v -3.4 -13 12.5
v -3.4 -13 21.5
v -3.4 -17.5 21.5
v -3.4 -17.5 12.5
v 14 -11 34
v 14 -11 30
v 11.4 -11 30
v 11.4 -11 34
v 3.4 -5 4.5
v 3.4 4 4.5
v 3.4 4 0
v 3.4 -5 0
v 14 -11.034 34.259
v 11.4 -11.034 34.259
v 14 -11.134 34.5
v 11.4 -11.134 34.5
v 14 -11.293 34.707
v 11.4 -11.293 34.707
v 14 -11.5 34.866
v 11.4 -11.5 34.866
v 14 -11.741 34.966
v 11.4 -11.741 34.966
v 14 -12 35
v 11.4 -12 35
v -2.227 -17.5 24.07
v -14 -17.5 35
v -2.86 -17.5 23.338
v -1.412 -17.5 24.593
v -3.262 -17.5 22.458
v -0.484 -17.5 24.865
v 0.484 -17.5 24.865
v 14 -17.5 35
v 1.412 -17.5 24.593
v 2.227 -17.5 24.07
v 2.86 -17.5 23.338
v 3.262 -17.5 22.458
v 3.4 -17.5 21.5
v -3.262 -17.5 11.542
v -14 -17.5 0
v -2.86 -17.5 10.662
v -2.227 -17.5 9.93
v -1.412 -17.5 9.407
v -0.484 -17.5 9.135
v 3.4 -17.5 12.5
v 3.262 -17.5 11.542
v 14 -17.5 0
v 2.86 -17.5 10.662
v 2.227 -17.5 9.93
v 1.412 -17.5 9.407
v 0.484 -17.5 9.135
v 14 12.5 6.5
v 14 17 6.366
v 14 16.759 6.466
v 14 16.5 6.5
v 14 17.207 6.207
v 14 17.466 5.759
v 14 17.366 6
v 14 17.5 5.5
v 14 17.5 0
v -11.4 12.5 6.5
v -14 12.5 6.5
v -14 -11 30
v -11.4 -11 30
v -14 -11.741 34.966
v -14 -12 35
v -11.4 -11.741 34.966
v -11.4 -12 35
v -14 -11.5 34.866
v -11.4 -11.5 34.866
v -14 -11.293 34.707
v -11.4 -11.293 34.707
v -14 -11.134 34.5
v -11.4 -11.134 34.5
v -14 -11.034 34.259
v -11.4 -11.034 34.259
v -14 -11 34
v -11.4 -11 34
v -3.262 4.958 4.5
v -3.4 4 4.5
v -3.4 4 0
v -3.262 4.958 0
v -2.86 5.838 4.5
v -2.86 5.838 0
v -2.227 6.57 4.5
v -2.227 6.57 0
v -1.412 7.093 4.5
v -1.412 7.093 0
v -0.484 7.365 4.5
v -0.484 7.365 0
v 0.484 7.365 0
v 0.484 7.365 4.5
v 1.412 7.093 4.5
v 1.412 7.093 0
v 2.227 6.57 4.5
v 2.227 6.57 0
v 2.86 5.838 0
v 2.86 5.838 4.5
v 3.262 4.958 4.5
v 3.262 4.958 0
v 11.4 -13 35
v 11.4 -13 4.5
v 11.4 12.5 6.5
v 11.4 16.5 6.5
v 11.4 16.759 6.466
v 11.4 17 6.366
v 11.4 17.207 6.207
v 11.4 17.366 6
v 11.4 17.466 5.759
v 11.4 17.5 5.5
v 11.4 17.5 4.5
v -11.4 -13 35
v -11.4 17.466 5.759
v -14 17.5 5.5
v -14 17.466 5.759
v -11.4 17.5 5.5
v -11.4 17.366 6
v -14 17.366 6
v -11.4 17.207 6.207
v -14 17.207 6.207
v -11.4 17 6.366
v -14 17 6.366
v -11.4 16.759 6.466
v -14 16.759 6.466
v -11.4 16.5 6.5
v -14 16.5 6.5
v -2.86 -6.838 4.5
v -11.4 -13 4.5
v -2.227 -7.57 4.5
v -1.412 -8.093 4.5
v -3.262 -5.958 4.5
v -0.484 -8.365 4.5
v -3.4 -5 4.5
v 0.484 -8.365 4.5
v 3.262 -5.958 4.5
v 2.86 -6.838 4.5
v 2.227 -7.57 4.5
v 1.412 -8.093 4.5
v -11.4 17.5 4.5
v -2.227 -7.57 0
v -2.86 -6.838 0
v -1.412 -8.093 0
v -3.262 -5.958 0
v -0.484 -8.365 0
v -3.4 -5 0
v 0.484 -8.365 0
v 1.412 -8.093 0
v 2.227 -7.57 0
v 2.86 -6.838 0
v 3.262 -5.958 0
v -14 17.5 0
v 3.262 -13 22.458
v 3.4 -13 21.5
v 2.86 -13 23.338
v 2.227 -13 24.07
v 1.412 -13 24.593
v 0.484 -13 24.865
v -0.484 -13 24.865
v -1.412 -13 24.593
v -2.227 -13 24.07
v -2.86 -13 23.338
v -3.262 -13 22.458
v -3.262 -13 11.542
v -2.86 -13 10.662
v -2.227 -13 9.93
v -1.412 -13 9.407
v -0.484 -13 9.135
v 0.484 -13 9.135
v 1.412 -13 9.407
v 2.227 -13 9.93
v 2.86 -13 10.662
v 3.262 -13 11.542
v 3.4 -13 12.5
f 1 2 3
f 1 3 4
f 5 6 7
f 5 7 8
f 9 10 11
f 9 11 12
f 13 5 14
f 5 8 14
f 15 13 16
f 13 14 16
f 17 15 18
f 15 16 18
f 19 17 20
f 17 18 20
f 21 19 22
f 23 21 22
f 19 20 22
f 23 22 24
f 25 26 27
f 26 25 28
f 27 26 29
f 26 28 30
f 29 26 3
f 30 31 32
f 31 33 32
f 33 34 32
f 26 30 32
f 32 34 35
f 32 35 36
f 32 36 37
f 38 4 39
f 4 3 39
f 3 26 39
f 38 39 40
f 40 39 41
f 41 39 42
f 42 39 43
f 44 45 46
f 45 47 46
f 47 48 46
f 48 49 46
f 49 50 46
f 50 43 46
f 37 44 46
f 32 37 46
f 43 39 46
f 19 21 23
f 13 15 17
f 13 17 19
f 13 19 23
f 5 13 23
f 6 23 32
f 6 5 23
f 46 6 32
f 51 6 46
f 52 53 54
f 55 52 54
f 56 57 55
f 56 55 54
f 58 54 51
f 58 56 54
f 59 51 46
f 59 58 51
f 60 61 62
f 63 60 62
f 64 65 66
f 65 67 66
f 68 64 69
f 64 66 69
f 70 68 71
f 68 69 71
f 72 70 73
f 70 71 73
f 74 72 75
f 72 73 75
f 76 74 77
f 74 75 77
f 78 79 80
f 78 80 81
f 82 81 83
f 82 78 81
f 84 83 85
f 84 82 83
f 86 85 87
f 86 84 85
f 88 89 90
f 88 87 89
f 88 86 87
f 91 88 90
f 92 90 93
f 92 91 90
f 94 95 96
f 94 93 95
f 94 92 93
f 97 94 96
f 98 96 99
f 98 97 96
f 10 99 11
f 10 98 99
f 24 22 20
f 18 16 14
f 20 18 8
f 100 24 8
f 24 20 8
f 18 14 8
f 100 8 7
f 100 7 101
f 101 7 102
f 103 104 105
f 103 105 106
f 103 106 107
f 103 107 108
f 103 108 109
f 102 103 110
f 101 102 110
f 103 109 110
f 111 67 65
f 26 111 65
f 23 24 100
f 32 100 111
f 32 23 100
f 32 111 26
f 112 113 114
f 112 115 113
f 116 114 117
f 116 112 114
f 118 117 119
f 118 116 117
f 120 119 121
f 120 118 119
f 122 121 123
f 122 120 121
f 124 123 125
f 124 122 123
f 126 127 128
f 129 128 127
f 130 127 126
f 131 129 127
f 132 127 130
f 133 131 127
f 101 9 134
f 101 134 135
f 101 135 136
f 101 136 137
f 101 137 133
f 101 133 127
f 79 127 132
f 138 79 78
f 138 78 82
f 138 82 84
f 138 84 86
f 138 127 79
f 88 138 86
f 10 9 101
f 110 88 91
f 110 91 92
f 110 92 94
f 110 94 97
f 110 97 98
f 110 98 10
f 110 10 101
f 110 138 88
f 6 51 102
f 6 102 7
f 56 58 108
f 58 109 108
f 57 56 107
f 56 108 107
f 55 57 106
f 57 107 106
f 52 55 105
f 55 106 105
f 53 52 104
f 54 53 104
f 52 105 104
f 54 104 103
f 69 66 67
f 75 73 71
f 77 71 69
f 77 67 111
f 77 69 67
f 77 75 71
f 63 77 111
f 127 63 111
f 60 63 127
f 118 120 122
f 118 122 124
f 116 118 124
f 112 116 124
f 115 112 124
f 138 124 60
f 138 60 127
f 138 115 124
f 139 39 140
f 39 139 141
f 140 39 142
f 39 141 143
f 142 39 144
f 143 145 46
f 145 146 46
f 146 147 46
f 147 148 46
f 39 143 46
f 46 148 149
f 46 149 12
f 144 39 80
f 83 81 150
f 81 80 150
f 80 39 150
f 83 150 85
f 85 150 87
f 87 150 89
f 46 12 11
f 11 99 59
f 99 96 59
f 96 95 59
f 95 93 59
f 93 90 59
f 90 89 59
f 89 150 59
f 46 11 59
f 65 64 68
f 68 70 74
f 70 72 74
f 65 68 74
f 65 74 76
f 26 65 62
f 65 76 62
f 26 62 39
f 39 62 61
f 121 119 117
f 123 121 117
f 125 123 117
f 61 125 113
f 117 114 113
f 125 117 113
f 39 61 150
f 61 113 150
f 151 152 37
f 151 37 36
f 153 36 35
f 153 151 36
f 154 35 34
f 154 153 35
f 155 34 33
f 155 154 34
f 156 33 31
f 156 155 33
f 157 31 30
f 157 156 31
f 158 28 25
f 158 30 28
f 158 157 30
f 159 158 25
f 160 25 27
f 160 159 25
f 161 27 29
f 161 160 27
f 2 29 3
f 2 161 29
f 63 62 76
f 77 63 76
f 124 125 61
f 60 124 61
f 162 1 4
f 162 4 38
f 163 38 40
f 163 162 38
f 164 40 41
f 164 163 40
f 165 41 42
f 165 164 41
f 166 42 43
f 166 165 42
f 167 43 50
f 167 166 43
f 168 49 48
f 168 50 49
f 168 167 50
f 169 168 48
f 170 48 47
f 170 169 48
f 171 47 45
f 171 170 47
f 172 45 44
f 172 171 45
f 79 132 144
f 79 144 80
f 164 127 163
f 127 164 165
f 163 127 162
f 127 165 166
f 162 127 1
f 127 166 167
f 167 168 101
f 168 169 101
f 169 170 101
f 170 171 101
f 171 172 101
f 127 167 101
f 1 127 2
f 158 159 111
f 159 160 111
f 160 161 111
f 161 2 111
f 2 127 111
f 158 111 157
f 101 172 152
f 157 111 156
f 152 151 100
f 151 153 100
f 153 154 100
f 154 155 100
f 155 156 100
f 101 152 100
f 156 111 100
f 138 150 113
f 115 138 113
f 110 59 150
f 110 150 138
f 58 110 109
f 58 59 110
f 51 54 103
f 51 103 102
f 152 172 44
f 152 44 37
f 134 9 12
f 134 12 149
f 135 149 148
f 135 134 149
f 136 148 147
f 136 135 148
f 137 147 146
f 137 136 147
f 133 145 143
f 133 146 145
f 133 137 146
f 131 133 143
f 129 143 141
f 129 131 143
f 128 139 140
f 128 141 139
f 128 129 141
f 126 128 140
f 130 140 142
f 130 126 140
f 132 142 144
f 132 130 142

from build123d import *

# Parameters (mm, degrees)
SKETCH_1_W          = 28
SKETCH_1_H          = 35
EXTRUDE_1_DEPTH     = 4.5
SKETCH_2_W          = 28
SKETCH_2_H          = 35
EXTRUDE_2_DEPTH     = 4.5
EXTRUDE_3_DEPTH     = 2.6
CUT_EXTRUDE_1_DEPTH = 38.848381736
CUT_EXTRUDE_2_DEPTH = 49.489689626
FILLET_1_R          = 1


with BuildPart() as part:
    # 草图1 → 凸台-拉伸1 (new body)
    with BuildSketch(Plane.XY):
        Rectangle(SKETCH_1_W, SKETCH_1_H)
    extrude(amount=EXTRUDE_1_DEPTH)

    # 草图2 → 凸台-拉伸2 (add)
    with BuildSketch(Plane.XZ.offset(17.5)):
        with Locations((0, 17.5)):
            Rectangle(SKETCH_2_W, SKETCH_2_H)
    extrude(amount=-EXTRUDE_2_DEPTH)

    # 草图3 → 凸台-拉伸3 (add)
    with BuildSketch(Plane.ZY.offset(14)):
        Polygon((4.5, 17.5), (6.5, 17.5), (6.5, 12.5), (30, -11), (35, -11), (35, -13), (4.5, -13), align=None)
    extrude_3 = extrude(amount=-EXTRUDE_3_DEPTH)

    # 镜向1: 凸台-拉伸3 across plane
    add(extrude_3.mirror(Plane(origin=(0, 0, 0), x_dir=(0, 0, 1), z_dir=(1, 0, 0))))

    # 草图5 → 切除-拉伸1 (cut, through all)
    with BuildSketch(Plane.XY.offset(4.5)):
        with BuildLine():
            Line((-3.4, -5), (-3.4, 4))
            ThreePointArc((-3.4, 4), (0, 7.4), (3.4, 4))
            Line((3.4, 4), (3.4, -5))
            ThreePointArc((3.4, -5), (0, -8.4), (-3.4, -5))
        make_face()
    extrude(amount=-CUT_EXTRUDE_1_DEPTH, mode=Mode.SUBTRACT)

    # 草图6 → 切除-拉伸2 (cut, through all)
    with BuildSketch(Plane(origin=(0, -13, 0), x_dir=(1, 0, 0), z_dir=(0, 1, 0))):
        with BuildLine():
            Line((3.4, -12.5), (3.4, -21.5))
            ThreePointArc((3.4, -21.5), (0, -24.9), (-3.4, -21.5))
            Line((-3.4, -21.5), (-3.4, -12.5))
            ThreePointArc((-3.4, -12.5), (0, -9.1), (3.4, -12.5))
        make_face()
    extrude(amount=-CUT_EXTRUDE_2_DEPTH, mode=Mode.SUBTRACT)

    # 圆角1
    fillet_1_edges = [part.edges().sort_by_distance(p)[0] for p in [
        (-12.7, 17.5, 6.5),
        (-12.7, -11, 35),
        (12.7, -11, 35),
        (12.7, 17.5, 6.5),
    ]]
    fillet(fillet_1_edges, radius=FILLET_1_R)


solid = part.part
